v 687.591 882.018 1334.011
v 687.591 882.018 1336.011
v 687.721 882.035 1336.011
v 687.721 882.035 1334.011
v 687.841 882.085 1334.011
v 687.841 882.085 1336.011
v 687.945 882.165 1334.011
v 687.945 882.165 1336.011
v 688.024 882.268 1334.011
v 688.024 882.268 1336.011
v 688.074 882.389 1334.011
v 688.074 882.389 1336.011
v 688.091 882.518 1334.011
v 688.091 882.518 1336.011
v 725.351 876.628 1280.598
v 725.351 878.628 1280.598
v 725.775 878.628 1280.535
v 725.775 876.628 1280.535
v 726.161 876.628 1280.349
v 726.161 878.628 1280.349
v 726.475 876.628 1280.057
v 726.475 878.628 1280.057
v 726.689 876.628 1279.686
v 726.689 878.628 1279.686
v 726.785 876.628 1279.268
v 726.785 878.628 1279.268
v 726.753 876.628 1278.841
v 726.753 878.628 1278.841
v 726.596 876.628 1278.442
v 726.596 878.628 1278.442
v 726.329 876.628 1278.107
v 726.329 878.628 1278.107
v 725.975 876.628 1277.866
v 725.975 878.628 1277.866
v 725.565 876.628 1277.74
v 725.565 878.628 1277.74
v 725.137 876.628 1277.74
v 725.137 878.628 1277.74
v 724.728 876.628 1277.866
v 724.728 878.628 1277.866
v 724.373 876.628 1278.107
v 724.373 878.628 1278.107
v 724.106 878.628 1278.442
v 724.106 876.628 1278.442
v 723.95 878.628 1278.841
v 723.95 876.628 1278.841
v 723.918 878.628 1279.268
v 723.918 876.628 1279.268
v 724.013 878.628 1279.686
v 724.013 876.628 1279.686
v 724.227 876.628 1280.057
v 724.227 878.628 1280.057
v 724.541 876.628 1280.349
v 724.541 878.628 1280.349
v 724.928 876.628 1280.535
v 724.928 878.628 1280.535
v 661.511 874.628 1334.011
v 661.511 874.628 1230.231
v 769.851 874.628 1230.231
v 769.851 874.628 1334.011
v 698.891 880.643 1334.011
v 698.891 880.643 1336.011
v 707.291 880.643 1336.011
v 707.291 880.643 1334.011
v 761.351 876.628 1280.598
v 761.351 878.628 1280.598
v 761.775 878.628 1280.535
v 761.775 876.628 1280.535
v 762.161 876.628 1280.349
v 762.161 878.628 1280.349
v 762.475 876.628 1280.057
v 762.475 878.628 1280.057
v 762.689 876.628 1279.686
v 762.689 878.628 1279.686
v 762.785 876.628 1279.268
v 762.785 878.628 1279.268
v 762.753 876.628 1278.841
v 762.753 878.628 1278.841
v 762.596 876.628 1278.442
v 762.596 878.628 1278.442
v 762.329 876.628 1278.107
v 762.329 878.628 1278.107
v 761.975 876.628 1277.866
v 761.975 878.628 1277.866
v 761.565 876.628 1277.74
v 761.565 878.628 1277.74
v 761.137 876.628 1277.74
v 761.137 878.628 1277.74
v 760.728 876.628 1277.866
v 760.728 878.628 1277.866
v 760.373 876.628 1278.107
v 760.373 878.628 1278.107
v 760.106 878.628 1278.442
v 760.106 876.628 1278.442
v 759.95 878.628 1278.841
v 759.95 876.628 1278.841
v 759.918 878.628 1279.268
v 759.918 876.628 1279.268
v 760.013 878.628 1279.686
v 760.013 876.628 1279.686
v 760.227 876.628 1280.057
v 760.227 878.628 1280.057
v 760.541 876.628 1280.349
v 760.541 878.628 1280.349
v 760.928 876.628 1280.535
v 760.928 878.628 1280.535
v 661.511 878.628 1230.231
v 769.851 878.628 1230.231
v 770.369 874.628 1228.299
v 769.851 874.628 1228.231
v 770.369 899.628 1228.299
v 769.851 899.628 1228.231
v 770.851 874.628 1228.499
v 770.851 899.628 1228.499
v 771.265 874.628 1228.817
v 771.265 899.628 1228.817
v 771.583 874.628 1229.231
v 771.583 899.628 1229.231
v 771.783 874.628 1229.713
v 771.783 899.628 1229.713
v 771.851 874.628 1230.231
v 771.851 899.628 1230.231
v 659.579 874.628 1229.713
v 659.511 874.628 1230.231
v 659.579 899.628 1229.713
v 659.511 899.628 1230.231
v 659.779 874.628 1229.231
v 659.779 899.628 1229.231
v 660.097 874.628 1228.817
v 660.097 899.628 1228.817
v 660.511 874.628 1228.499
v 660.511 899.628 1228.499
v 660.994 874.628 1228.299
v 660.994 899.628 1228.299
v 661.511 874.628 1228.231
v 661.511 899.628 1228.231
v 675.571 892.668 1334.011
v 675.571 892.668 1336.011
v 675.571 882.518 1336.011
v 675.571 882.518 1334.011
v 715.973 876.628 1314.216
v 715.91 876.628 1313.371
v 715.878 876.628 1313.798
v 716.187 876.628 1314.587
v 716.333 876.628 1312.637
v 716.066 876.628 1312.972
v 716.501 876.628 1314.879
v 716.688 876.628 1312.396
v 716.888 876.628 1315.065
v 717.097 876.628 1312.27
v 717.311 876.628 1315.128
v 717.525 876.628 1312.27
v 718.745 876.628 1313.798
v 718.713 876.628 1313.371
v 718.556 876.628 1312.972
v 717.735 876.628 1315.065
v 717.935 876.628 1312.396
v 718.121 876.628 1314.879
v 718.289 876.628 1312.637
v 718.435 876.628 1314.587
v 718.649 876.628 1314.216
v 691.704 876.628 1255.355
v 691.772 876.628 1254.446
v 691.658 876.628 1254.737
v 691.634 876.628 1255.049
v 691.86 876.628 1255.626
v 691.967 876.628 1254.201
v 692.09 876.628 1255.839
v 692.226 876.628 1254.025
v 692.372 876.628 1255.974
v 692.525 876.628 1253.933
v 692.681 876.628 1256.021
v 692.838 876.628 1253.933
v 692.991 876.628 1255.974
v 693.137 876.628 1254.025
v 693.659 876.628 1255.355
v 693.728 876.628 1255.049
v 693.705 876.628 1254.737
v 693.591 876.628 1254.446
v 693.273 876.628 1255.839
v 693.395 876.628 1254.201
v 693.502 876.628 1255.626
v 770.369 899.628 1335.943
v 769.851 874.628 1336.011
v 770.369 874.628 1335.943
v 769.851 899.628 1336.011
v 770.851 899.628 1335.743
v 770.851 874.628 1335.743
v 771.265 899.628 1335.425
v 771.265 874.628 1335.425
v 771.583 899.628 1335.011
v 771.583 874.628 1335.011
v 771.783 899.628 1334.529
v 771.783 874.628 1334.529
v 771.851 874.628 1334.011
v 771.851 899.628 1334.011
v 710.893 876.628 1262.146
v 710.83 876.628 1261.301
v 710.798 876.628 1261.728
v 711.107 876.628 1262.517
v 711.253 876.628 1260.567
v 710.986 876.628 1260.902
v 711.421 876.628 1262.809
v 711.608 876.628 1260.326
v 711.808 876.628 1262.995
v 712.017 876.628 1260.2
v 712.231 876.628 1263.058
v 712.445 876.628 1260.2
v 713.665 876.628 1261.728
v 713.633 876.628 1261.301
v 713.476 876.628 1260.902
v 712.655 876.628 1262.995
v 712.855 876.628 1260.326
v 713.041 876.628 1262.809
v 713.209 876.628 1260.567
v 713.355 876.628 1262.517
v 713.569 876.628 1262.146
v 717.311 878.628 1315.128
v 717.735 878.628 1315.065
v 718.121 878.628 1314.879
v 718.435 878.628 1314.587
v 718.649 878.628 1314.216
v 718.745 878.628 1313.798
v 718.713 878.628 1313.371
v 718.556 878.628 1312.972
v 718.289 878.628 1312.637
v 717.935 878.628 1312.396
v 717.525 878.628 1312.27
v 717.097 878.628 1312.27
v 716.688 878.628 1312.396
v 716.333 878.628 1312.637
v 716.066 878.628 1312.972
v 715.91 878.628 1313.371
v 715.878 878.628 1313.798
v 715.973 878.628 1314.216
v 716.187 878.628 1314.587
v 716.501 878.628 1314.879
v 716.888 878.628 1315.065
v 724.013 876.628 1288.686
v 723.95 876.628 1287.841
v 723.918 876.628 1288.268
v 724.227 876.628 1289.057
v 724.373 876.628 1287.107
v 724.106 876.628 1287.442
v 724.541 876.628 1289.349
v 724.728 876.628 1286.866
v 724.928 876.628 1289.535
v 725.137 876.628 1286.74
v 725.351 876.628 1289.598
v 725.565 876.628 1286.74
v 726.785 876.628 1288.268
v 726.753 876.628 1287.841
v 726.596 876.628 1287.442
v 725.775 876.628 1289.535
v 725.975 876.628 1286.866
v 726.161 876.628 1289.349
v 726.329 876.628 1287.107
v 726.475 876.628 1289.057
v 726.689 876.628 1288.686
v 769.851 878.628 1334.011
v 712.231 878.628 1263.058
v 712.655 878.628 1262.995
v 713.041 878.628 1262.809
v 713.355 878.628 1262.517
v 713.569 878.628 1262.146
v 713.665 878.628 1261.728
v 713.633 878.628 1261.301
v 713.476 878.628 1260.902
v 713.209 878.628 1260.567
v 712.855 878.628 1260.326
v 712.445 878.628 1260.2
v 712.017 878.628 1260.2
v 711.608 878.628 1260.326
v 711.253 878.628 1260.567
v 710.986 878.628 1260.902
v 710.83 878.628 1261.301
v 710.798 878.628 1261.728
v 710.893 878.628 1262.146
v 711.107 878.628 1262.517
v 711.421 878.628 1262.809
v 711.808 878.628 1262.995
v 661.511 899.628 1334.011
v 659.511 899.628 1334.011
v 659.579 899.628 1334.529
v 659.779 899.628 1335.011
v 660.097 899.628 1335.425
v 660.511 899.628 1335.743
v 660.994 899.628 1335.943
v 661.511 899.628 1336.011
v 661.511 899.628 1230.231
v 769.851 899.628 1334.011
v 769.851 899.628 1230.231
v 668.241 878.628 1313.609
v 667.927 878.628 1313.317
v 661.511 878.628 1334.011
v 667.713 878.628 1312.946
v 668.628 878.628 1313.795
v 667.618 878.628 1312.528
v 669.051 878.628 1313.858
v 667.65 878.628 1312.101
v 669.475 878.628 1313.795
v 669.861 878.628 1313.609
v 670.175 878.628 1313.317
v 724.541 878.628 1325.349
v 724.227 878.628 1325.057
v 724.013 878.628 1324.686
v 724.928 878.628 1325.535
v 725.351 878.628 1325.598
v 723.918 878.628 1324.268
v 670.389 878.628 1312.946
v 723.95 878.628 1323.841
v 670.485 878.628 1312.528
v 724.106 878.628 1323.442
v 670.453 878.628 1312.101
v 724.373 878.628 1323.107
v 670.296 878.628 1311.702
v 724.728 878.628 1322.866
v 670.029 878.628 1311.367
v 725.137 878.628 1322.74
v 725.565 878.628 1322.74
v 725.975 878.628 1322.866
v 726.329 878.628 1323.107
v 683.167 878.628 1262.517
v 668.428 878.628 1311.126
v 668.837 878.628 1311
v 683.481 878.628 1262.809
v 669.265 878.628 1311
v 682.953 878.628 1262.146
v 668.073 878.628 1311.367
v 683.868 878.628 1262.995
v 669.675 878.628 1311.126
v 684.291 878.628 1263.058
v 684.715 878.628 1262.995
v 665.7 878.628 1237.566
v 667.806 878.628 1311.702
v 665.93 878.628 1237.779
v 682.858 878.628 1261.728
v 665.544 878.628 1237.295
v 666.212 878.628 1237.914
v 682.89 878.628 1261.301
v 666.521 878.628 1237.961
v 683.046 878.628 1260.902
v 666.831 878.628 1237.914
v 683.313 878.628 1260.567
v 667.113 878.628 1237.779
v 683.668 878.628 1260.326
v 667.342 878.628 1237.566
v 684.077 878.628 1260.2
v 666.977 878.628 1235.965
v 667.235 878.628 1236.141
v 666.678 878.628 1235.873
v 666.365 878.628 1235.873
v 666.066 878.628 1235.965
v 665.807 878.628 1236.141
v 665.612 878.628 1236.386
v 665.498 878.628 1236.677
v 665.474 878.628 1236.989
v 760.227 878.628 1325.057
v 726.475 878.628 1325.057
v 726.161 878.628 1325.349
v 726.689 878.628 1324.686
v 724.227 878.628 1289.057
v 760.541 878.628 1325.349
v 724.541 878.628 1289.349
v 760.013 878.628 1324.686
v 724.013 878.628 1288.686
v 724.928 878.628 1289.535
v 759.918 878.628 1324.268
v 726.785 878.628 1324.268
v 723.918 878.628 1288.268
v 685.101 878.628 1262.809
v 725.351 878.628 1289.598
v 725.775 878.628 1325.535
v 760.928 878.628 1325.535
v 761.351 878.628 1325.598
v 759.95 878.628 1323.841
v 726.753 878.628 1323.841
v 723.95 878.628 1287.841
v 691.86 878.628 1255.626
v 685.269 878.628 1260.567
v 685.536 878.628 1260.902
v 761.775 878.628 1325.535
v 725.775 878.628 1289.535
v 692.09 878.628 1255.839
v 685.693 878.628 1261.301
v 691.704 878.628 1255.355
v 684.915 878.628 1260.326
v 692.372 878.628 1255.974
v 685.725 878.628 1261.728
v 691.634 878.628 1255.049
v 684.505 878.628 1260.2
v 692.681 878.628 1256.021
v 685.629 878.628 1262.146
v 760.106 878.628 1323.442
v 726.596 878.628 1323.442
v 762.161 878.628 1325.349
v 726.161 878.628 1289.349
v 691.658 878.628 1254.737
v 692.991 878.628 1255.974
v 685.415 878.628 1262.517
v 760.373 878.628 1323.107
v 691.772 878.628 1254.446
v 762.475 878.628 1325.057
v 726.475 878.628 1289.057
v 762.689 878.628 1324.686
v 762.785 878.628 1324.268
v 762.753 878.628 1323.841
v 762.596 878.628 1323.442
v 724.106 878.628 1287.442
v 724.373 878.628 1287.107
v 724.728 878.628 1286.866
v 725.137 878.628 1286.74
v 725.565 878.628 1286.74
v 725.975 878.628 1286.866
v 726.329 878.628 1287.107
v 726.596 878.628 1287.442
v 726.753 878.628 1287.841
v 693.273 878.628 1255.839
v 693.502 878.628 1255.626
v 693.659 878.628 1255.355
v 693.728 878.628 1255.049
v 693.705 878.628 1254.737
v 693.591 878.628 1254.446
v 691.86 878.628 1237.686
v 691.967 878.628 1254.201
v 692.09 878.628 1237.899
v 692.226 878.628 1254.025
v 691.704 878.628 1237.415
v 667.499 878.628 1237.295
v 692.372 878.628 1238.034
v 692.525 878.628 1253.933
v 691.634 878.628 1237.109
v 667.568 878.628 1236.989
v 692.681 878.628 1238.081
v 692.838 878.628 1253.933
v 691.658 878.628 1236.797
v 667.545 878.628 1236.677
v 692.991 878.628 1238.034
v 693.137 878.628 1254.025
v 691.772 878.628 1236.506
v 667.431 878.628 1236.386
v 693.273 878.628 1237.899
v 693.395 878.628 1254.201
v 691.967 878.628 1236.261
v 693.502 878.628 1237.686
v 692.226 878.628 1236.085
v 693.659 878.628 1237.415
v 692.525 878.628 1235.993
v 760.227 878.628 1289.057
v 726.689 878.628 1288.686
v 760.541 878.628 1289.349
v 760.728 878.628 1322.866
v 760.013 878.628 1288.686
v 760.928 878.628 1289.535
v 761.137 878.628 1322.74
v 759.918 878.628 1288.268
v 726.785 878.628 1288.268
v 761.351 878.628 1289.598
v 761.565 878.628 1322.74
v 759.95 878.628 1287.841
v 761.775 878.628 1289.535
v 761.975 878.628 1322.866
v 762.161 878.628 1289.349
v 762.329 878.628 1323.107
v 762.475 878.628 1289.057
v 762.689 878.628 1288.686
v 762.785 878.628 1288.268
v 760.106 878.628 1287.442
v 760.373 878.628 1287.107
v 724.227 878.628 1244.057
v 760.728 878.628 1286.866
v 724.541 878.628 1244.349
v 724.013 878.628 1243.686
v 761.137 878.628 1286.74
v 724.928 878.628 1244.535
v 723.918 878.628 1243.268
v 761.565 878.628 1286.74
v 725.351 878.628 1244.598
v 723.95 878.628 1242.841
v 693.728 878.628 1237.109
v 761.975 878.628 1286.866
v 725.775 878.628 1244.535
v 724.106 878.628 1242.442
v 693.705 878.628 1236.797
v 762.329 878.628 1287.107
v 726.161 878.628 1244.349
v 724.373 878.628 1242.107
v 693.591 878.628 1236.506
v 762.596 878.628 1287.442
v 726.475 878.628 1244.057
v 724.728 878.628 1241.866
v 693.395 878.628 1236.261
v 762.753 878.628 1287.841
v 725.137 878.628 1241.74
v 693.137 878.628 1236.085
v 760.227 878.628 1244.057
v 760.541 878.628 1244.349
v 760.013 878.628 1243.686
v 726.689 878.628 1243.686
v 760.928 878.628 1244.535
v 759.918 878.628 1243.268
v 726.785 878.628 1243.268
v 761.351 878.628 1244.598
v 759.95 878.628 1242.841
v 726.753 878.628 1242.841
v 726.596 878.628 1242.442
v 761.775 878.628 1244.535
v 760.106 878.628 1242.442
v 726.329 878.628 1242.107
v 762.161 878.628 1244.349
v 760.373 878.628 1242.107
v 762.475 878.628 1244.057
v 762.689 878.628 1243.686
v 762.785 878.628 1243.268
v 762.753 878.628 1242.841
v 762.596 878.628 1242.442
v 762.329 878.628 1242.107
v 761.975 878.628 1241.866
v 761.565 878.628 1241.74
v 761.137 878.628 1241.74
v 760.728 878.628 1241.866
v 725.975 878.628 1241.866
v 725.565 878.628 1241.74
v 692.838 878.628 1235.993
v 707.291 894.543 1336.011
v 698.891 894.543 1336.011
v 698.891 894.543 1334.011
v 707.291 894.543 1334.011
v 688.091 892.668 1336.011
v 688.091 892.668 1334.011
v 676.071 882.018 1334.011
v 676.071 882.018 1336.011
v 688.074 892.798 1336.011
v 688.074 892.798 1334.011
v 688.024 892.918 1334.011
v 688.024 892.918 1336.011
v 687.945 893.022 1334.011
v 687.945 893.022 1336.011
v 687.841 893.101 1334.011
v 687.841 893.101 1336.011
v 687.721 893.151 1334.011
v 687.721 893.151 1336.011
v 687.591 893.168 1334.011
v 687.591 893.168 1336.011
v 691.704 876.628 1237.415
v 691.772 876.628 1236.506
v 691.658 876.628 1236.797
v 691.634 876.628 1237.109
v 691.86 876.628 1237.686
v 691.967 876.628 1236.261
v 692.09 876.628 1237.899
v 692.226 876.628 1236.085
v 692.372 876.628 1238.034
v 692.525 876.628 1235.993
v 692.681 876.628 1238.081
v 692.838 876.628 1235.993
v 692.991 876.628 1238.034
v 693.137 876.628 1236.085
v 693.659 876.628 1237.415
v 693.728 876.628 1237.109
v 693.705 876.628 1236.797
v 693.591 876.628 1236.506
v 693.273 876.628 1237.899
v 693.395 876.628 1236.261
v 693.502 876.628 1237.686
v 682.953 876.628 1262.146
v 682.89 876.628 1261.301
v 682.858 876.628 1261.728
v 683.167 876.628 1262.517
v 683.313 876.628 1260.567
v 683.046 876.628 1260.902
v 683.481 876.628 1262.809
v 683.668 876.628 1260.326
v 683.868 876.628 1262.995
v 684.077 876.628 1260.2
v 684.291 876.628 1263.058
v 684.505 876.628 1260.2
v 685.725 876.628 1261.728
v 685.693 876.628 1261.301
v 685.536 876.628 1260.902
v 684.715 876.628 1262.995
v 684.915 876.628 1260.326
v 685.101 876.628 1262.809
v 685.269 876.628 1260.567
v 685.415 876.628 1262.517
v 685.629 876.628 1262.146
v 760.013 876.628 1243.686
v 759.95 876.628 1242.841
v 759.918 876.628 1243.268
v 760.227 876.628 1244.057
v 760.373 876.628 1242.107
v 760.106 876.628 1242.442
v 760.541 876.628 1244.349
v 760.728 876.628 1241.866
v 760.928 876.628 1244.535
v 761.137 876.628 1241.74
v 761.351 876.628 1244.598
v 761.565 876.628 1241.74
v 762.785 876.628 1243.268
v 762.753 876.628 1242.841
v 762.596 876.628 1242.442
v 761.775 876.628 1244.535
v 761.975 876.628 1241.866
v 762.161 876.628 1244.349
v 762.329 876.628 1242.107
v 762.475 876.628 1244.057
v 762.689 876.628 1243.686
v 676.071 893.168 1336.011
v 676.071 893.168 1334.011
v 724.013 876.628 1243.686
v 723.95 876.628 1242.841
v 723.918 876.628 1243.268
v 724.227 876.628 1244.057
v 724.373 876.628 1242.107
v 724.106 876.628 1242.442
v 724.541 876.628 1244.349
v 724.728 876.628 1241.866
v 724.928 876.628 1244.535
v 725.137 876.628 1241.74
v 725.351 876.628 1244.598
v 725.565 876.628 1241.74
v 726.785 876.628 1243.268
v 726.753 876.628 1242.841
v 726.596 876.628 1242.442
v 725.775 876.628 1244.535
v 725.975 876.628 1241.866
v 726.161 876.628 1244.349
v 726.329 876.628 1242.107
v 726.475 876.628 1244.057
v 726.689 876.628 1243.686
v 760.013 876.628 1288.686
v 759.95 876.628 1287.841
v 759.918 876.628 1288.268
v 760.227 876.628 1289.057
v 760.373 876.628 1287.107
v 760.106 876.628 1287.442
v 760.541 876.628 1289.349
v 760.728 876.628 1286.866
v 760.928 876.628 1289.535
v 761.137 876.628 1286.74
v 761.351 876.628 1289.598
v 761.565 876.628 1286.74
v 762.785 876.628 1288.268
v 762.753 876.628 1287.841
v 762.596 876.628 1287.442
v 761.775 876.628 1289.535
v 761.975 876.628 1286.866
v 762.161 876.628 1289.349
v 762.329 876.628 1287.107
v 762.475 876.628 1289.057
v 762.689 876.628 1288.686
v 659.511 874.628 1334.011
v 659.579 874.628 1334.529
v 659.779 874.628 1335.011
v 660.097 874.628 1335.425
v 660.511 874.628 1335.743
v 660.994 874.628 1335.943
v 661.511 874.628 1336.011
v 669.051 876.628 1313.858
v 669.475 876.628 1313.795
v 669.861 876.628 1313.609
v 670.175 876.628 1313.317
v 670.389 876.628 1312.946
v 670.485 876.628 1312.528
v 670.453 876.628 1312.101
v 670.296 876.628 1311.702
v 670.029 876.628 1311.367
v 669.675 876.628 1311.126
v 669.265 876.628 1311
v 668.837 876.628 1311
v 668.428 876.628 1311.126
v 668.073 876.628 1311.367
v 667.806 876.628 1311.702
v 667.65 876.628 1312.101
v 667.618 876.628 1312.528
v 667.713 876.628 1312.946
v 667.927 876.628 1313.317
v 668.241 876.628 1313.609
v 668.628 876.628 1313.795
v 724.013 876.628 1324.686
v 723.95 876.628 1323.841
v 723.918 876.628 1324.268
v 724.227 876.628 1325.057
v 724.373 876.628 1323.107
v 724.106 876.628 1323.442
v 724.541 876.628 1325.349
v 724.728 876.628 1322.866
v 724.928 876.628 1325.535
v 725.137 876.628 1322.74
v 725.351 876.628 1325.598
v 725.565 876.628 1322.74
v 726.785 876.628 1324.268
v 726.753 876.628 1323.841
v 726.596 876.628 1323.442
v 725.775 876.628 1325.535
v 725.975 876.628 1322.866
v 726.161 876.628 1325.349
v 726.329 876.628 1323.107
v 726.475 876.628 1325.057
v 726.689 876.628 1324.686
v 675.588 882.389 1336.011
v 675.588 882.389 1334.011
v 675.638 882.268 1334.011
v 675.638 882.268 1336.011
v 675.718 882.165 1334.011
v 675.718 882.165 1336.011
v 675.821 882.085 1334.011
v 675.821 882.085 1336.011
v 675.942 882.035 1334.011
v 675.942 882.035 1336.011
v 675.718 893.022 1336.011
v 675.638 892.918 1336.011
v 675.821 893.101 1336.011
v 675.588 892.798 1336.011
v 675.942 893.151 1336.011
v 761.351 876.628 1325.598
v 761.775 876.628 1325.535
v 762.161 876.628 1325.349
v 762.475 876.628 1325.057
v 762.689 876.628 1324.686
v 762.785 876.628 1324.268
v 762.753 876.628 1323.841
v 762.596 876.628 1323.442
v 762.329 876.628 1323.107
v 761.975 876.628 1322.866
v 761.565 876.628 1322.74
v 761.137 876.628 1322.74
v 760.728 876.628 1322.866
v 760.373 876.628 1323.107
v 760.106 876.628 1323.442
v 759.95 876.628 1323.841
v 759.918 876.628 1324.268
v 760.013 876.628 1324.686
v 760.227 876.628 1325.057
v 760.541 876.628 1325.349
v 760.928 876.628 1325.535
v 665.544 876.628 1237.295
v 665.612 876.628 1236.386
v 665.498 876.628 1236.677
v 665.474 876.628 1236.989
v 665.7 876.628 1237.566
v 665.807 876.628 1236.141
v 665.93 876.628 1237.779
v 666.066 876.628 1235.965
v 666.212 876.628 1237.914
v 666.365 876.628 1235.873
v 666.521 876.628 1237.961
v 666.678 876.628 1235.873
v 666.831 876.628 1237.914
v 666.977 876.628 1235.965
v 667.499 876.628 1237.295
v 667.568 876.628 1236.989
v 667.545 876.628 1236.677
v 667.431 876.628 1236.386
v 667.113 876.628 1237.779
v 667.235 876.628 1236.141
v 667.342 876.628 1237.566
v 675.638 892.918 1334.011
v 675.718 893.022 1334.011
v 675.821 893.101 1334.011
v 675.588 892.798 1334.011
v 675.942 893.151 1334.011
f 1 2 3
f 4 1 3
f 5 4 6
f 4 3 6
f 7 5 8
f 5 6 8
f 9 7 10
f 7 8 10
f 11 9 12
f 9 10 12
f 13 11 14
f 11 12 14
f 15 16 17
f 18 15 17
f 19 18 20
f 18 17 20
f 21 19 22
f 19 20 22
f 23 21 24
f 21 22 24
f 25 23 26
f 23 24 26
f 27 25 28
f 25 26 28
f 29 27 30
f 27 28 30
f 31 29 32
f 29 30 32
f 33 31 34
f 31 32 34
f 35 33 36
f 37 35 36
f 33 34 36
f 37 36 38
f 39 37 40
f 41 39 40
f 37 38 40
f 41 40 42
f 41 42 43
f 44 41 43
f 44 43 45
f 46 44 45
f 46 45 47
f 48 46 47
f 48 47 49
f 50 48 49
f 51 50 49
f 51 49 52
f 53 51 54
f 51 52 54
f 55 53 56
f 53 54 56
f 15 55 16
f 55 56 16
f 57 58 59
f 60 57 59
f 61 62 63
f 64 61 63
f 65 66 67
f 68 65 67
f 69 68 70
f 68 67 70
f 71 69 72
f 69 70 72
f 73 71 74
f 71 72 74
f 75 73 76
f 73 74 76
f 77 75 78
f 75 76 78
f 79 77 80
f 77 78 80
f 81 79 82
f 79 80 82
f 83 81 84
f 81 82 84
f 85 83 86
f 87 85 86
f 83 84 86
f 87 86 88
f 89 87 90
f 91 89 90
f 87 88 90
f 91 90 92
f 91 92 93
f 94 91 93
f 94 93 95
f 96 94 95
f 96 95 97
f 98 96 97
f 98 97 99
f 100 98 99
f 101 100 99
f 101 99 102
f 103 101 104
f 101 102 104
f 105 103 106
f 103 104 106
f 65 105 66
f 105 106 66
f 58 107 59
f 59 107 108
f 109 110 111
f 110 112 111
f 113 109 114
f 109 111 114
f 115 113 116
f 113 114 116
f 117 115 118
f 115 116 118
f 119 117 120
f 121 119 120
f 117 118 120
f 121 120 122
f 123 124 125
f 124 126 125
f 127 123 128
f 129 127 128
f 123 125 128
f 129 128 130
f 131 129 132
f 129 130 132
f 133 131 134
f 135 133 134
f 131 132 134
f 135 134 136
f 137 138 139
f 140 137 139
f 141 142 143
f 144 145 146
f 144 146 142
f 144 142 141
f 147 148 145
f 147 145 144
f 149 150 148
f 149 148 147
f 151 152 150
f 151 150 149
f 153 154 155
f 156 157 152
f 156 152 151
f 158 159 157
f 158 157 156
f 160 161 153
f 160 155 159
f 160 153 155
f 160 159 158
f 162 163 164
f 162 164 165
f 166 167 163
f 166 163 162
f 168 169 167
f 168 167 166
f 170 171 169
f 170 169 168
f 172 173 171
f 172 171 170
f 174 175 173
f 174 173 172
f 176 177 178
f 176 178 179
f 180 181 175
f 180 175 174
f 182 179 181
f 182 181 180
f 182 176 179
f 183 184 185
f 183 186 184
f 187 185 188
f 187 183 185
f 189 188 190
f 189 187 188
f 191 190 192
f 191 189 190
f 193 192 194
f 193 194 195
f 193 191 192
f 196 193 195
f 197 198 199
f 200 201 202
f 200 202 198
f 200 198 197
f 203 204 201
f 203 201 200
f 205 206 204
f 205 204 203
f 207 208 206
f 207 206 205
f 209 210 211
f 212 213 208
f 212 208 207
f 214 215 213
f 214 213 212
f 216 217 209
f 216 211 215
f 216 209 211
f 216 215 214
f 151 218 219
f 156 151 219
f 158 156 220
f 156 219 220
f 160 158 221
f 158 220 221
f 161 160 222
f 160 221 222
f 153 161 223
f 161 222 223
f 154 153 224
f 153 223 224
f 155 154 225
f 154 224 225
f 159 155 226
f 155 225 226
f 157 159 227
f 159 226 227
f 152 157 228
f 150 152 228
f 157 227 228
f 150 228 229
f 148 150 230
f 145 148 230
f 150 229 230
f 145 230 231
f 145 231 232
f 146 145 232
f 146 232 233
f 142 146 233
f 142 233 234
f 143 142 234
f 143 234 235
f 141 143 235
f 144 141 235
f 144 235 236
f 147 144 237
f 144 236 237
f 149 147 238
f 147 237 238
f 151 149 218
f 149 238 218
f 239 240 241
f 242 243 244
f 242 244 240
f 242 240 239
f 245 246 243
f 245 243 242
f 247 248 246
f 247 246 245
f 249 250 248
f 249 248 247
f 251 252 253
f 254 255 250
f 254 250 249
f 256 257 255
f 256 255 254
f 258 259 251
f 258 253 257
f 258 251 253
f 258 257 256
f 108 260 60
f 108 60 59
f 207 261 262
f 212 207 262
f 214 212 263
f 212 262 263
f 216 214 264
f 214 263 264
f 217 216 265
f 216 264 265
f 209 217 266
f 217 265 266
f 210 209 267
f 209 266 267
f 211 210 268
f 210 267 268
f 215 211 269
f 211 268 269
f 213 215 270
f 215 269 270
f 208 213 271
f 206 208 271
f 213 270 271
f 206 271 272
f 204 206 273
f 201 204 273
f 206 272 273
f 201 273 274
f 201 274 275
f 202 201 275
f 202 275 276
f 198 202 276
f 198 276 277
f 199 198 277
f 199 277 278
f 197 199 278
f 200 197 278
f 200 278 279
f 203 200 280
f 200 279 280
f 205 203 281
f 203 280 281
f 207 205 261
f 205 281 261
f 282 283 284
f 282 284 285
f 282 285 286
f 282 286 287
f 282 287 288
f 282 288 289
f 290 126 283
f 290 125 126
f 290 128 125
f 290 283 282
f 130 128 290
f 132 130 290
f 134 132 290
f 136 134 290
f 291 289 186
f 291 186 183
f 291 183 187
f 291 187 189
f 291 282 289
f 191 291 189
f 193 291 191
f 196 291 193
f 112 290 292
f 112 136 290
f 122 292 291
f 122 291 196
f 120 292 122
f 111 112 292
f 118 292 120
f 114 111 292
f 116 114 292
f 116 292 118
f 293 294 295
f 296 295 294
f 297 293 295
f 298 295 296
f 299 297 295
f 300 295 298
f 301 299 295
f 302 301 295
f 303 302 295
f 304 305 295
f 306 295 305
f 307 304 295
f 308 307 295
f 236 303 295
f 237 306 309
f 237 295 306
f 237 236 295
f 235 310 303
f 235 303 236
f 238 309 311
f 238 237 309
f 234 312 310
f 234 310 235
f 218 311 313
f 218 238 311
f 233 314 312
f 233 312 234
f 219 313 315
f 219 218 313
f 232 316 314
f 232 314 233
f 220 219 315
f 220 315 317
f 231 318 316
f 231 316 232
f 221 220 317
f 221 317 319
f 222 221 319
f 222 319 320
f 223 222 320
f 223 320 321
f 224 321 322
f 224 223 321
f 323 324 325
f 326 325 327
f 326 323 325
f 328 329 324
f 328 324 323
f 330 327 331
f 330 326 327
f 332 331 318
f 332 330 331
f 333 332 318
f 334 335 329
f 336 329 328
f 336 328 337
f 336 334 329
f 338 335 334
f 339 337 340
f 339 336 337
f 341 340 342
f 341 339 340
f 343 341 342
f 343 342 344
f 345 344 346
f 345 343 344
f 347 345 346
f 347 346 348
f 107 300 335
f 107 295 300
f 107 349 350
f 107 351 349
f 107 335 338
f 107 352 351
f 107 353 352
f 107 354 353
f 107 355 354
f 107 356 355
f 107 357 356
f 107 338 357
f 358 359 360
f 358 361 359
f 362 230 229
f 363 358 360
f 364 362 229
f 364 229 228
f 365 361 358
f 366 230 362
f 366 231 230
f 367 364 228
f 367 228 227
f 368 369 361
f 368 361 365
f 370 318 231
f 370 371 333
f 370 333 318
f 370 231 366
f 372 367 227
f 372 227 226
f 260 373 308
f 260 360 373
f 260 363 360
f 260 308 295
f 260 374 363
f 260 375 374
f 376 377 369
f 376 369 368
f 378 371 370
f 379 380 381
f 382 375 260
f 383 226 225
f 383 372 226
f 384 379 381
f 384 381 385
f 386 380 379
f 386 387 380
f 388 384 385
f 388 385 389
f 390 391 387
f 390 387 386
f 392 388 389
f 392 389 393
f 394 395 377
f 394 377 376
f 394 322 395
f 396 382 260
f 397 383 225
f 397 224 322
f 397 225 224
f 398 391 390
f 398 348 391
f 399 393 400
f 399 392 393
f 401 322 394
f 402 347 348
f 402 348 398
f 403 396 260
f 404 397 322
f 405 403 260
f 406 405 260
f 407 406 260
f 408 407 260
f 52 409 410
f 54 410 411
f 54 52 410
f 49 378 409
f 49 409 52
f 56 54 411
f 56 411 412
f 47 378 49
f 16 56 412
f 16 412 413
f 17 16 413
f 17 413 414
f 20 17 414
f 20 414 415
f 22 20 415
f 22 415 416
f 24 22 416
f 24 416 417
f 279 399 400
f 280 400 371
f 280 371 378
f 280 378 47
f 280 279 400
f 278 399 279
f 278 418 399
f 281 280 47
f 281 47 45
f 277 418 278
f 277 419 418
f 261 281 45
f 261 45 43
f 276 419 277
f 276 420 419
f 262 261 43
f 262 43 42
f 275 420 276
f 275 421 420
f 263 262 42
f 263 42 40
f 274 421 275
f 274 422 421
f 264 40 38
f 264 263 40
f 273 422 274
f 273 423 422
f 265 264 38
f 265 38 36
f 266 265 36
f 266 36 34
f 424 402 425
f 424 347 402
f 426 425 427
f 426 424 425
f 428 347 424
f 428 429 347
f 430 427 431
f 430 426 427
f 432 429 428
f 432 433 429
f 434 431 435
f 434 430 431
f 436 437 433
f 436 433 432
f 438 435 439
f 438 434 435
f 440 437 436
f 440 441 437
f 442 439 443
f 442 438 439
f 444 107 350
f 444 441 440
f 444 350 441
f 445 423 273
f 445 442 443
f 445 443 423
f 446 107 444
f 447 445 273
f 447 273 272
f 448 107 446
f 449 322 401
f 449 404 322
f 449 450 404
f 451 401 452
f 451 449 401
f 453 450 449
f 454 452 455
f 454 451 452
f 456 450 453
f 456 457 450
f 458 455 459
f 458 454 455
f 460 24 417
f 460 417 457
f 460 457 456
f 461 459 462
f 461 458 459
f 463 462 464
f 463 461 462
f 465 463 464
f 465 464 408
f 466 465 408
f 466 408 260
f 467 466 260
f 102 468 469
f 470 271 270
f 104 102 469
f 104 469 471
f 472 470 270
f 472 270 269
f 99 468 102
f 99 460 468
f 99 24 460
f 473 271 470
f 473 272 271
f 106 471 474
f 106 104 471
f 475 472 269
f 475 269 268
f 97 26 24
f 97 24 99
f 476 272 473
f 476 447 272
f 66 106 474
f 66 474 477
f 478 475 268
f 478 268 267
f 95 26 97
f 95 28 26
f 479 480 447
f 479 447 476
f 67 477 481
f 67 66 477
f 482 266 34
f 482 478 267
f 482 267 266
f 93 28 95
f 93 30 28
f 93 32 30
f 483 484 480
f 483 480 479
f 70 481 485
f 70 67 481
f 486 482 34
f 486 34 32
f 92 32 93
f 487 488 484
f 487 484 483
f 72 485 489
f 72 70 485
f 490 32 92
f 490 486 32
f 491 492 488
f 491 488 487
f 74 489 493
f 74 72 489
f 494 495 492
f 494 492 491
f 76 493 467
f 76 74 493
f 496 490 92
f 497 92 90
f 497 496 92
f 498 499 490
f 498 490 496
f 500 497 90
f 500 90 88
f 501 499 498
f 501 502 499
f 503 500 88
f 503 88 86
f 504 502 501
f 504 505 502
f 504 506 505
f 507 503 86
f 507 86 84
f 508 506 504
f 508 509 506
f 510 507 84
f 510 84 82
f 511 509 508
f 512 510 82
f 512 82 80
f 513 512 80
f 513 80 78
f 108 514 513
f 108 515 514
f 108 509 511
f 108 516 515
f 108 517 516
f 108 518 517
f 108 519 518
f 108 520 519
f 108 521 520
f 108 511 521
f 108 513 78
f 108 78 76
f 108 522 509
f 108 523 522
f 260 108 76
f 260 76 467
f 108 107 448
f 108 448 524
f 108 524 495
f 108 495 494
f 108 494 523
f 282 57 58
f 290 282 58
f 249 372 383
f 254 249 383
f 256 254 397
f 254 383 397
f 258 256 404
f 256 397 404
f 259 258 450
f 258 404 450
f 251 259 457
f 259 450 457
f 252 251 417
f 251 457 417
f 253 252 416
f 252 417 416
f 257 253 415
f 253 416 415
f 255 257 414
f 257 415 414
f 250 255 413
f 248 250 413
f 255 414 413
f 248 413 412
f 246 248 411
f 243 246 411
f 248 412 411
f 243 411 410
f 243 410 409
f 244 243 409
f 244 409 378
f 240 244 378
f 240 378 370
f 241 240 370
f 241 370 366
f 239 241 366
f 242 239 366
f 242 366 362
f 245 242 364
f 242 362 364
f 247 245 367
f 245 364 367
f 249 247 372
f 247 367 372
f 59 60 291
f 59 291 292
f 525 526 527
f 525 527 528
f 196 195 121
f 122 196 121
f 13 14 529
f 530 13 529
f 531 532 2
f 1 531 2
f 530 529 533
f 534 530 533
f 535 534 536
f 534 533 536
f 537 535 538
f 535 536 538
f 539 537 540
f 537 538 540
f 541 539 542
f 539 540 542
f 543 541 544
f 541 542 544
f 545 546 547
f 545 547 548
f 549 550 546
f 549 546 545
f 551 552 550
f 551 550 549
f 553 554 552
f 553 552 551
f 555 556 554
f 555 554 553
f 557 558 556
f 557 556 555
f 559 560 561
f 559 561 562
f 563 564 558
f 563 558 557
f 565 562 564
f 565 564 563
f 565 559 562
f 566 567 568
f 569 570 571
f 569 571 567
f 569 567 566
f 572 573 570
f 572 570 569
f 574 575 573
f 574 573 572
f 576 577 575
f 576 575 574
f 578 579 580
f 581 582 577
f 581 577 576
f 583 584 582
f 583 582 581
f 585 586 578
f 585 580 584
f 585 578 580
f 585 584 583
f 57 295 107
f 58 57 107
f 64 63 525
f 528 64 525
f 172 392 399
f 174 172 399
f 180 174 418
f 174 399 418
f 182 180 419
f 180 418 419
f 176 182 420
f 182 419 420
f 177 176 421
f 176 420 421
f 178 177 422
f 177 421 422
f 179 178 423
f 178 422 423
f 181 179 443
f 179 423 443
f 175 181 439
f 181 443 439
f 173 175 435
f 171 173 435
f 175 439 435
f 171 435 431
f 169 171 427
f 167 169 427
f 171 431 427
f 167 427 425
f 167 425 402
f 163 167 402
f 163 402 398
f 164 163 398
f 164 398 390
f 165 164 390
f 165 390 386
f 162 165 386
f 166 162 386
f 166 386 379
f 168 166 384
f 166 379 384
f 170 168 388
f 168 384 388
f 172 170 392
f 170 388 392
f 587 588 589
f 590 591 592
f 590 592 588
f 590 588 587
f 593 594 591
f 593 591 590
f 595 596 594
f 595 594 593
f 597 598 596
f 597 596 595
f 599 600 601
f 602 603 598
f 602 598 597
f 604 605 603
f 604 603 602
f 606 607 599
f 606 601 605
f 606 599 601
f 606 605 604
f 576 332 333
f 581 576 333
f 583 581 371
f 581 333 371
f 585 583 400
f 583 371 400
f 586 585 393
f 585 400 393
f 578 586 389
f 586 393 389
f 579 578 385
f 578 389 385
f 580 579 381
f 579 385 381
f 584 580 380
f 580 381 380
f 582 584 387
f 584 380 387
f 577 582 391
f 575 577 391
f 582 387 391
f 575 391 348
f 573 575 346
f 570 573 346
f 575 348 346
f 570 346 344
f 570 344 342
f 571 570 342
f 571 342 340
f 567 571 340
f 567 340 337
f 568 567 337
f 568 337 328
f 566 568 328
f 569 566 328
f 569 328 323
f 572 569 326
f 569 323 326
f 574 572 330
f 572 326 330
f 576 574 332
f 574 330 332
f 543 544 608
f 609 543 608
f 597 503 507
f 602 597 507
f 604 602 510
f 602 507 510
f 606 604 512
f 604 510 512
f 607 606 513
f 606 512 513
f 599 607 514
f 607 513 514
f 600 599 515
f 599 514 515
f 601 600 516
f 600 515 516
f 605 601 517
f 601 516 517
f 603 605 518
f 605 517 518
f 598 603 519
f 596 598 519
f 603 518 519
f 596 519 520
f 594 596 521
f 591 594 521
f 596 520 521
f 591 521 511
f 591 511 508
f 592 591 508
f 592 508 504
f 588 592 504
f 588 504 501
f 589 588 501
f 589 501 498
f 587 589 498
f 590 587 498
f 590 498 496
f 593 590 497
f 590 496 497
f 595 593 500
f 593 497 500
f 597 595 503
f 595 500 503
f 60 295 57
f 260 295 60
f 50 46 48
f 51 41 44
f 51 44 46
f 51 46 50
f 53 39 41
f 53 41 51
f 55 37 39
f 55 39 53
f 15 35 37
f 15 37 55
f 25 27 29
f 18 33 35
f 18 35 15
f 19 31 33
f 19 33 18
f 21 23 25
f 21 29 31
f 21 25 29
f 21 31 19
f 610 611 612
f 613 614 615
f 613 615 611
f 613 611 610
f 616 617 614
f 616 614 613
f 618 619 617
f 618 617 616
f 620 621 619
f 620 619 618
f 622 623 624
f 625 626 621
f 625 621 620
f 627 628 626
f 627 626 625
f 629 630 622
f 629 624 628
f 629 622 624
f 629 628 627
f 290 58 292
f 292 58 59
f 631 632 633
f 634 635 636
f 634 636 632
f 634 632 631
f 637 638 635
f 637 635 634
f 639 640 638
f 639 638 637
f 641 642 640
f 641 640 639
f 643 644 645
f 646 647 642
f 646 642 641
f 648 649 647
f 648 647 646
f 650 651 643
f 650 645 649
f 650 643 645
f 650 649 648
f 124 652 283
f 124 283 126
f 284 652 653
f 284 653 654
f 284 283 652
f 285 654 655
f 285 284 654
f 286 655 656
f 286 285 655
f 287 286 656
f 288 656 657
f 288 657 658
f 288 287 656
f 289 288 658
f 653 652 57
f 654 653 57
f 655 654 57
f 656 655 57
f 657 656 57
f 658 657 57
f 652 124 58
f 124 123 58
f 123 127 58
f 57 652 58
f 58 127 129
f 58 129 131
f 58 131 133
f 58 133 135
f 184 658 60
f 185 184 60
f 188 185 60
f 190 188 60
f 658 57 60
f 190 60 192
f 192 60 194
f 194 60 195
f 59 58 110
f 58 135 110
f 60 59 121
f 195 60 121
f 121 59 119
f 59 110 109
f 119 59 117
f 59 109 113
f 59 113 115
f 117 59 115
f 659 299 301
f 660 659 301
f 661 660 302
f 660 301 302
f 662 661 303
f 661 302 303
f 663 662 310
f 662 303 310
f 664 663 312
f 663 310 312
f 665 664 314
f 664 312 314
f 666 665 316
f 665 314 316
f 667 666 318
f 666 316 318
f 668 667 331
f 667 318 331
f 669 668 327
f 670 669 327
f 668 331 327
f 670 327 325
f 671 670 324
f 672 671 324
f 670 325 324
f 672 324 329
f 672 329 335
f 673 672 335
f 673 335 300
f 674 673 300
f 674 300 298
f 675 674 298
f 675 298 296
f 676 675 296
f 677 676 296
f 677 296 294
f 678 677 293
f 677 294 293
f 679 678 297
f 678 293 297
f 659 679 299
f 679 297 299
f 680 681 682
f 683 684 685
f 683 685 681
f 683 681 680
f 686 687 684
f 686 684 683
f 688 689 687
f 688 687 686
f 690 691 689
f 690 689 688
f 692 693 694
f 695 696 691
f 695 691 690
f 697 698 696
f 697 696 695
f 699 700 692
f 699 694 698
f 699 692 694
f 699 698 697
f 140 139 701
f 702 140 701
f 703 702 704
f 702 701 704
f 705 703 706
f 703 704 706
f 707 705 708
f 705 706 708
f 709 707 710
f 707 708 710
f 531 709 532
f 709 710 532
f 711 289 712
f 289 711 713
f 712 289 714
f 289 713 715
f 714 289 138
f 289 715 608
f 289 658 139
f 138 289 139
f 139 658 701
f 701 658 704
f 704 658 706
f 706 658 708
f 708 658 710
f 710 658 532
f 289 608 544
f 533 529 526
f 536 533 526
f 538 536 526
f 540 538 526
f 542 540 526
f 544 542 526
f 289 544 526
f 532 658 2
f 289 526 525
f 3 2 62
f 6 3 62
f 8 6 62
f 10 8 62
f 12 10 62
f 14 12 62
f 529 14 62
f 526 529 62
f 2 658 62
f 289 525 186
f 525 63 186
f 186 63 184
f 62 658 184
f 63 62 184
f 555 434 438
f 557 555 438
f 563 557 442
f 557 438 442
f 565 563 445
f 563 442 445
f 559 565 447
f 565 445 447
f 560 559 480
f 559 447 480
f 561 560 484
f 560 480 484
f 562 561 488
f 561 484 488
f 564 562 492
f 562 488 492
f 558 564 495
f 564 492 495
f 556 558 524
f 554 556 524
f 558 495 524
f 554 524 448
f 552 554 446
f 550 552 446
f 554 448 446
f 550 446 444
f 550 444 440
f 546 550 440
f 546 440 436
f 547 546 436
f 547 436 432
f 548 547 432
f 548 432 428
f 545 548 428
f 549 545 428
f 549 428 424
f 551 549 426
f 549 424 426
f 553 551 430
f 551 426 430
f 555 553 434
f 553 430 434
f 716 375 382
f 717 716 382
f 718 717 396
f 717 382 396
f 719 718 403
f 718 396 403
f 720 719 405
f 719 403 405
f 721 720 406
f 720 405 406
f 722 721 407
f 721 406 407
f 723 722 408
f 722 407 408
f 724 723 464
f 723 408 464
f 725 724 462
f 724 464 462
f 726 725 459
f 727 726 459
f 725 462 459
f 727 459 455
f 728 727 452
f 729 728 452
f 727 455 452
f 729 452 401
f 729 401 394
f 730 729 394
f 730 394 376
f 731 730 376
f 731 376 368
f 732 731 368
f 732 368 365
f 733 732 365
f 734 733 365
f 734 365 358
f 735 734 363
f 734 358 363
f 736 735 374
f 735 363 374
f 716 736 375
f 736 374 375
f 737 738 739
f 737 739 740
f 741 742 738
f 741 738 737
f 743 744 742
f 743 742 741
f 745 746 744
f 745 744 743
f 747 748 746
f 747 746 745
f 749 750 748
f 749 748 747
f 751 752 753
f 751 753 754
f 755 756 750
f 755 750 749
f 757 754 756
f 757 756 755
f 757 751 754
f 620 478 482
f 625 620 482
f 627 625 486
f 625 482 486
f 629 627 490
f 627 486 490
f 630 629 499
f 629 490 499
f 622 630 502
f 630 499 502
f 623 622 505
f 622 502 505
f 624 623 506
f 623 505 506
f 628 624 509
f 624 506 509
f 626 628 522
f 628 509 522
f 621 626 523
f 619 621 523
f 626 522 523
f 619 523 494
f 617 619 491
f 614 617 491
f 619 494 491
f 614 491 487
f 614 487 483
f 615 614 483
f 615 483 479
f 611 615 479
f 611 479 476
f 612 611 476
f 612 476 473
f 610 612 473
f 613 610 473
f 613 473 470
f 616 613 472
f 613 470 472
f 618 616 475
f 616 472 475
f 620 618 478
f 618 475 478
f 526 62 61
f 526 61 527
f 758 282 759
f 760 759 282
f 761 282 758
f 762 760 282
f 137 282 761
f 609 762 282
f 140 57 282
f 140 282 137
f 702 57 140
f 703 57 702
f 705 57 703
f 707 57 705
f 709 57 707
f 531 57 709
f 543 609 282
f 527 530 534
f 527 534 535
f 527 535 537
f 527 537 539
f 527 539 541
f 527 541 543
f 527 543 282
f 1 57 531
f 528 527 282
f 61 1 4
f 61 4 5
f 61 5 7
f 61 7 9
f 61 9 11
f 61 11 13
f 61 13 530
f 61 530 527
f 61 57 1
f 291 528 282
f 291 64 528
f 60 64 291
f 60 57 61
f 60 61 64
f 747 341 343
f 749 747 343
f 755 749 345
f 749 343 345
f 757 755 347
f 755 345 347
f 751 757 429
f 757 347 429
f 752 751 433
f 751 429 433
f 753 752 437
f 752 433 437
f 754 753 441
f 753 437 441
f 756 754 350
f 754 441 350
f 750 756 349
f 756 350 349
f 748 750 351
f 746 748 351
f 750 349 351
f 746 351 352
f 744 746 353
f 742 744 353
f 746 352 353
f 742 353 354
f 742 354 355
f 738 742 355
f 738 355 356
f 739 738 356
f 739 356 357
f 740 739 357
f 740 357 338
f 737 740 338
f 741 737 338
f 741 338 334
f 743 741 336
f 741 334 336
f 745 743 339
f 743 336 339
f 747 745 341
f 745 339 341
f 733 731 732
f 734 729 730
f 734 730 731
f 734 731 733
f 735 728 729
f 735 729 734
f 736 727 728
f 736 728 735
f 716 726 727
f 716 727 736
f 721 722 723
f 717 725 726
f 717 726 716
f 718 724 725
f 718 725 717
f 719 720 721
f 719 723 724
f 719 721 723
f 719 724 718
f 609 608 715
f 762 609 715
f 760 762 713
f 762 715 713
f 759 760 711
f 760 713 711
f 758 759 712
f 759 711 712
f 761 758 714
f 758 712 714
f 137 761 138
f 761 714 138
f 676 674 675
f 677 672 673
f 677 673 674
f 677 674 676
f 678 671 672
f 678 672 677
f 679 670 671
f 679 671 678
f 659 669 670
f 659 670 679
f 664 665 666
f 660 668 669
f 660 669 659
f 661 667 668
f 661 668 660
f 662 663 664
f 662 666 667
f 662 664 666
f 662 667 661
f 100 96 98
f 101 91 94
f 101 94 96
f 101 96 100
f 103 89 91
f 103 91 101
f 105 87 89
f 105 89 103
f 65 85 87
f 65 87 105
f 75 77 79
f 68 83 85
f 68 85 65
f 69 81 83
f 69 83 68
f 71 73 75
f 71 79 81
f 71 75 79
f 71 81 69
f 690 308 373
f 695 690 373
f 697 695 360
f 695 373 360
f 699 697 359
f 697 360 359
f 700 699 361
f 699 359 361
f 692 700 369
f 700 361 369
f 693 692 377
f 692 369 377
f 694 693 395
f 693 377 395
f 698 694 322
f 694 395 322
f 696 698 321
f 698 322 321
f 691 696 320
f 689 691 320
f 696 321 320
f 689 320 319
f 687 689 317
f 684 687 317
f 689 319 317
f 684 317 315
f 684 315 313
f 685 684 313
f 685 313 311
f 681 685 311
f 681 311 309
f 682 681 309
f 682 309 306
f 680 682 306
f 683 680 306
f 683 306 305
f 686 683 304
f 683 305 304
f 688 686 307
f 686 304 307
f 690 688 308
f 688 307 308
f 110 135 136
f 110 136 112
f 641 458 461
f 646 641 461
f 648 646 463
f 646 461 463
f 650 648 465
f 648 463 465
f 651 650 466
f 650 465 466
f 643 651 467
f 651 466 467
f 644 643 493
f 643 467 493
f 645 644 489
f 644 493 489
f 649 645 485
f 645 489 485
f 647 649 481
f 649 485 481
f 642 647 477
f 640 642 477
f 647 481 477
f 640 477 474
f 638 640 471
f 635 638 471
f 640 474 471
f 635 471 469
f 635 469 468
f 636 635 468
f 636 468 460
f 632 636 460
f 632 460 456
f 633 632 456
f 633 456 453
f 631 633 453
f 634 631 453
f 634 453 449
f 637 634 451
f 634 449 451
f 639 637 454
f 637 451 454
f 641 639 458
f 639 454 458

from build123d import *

# Parameters (mm, degrees)
SKETCH1_W           = 108.34
SKETCH1_H           = 103.78
BOSS_EXTRUDE1_DEPTH = 4
SKETCH2_W           = 112.34
SKETCH2_H           = 107.78
SKETCH2_W_2         = 108.34
SKETCH2_H_2         = 103.78
BOSS_EXTRUDE2_DEPTH = 25
SKETCH4_W           = 11.12
SKETCH4_H           = 9.75
CUT_EXTRUDE1_DEPTH  = 2
FILLET1_R           = 2
SKETCH5_R           = 1.4375
SKETCH5_R_2         = 1.05
CUT_EXTRUDE2_DEPTH  = 2
SKETCH6_W           = 8.4
SKETCH6_H           = 13.9
CUT_EXTRUDE3_DEPTH  = 2


with BuildPart() as part:
    # Sketch1 → Boss-Extrude1 (new body)
    with BuildSketch(Plane(origin=(0, 878.628416044, 0), x_dir=(1, 0, 0), z_dir=(0, 1, 0))):
        with Locations((715.681242052, -1282.120951231)):
            Rectangle(SKETCH1_W, SKETCH1_H)
    extrude(amount=-BOSS_EXTRUDE1_DEPTH)

    # Sketch5 → Cut-Extrude2 (cut)
    with BuildSketch(Plane(origin=(0, 878.628416044, 0), x_dir=(1, 0, 0), z_dir=(0, 1, 0))):
        with Locations(Location((684.291242052, -1261.620951231, 0), (0, 0, 270))):
            Circle(SKETCH5_R)
        with Locations(Location((666.521242052, -1236.910951231, 0), (0, 0, 270))):
            Circle(SKETCH5_R_2)
        with Locations(Location((692.681242052, -1237.030951231, 0), (0, 0, 270))):
            Circle(SKETCH5_R_2)
        with Locations(Location((692.681242052, -1254.970951231, 0), (0, 0, 270))):
            Circle(SKETCH5_R_2)
        with Locations(Location((712.231242052, -1261.620951231, 0), (0, 0, 270))):
            Circle(SKETCH5_R)
        with Locations(Location((725.351242052, -1243.160951231, 0), (0, 0, 270))):
            Circle(SKETCH5_R)
        with Locations(Location((761.351242052, -1243.160951231, 0), (0, 0, 270))):
            Circle(SKETCH5_R)
        with Locations(Location((725.351242052, -1279.160951231, 0), (0, 0, 270))):
            Circle(SKETCH5_R)
        with Locations(Location((761.351242052, -1279.160951231, 0), (0, 0, 270))):
            Circle(SKETCH5_R)
        with Locations(Location((761.351242052, -1288.160951231, 0), (0, 0, 270))):
            Circle(SKETCH5_R)
        with Locations(Location((725.351242052, -1288.160951231, 0), (0, 0, 270))):
            Circle(SKETCH5_R)
        with Locations(Location((761.351242052, -1324.160951231, 0), (0, 0, 270))):
            Circle(SKETCH5_R)
        with Locations(Location((725.351242052, -1324.160951231, 0), (0, 0, 270))):
            Circle(SKETCH5_R)
        with Locations(Location((717.311242052, -1313.690951231, 0), (0, 0, 270))):
            Circle(SKETCH5_R)
        with Locations(Location((669.051242052, -1312.420951231, 0), (0, 0, 270))):
            Circle(SKETCH5_R)
    extrude(amount=-CUT_EXTRUDE2_DEPTH, mode=Mode.SUBTRACT)


with BuildPart() as body_2:
    # Sketch2 → Boss-Extrude2 (new body)
    with BuildSketch(Plane(origin=(0, 874.628416044, 0), x_dir=(1, 0, 0), z_dir=(0, 1, 0))):
        with Locations((715.681242052, -1282.120951231)):
            Rectangle(SKETCH2_W, SKETCH2_H)
        with Locations((715.681242052, -1282.120951231)):
            Rectangle(SKETCH2_W_2, SKETCH2_H_2, mode=Mode.SUBTRACT)
    extrude(amount=BOSS_EXTRUDE2_DEPTH)

    # Sketch4 → Cut-Extrude1 (cut)
    with BuildSketch(Plane.XY.offset(1336.010951231)):
        with BuildLine():
            Line((687.591242052, 893.168416044), (676.071242052, 893.168416044))
            ThreePointArc((676.071242052, 893.168416044), (675.717688661, 893.021969435), (675.571242052, 892.668416044))
            Line((675.571242052, 892.668416044), (675.571242052, 882.518416044))
            ThreePointArc((675.571242052, 882.518416044), (675.717688661, 882.164862654), (676.071242052, 882.018416044))
            Line((676.071242052, 882.018416044), (687.591242052, 882.018416044))
            ThreePointArc((687.591242052, 882.018416044), (687.944795443, 882.164862654), (688.091242052, 882.518416044))
            Line((688.091242052, 882.518416044), (688.091242052, 892.668416044))
            ThreePointArc((688.091242052, 892.668416044), (687.944795443, 893.021969435), (687.591242052, 893.168416044))
        make_face()
        with Locations((681.831242052, 887.593416044)):
            Rectangle(SKETCH4_W, SKETCH4_H, mode=Mode.SUBTRACT)
        with Locations((681.831242052, 887.593416044)):
            Rectangle(SKETCH4_W, SKETCH4_H)
    extrude(amount=-CUT_EXTRUDE1_DEPTH, mode=Mode.SUBTRACT)

    # Fillet1
    fillet1_edges = [body_2.edges().sort_by_distance(p)[0] for p in [
        (771.851242052, 887.128416044, 1228.230951231),
        (659.511242052, 887.128416044, 1228.230951231),
        (659.511242052, 887.128416044, 1336.010951231),
        (771.851242052, 887.128416044, 1336.010951231),
    ]]
    fillet(fillet1_edges, radius=FILLET1_R)

    # Sketch6 → Cut-Extrude3 (cut)
    with BuildSketch(Plane.XY.offset(1336.010951231)):
        with Locations((703.091242052, 887.593416044)):
            Rectangle(SKETCH6_W, SKETCH6_H)
    extrude(amount=-CUT_EXTRUDE3_DEPTH, mode=Mode.SUBTRACT)


solid = Compound([part.part, body_2.part])
